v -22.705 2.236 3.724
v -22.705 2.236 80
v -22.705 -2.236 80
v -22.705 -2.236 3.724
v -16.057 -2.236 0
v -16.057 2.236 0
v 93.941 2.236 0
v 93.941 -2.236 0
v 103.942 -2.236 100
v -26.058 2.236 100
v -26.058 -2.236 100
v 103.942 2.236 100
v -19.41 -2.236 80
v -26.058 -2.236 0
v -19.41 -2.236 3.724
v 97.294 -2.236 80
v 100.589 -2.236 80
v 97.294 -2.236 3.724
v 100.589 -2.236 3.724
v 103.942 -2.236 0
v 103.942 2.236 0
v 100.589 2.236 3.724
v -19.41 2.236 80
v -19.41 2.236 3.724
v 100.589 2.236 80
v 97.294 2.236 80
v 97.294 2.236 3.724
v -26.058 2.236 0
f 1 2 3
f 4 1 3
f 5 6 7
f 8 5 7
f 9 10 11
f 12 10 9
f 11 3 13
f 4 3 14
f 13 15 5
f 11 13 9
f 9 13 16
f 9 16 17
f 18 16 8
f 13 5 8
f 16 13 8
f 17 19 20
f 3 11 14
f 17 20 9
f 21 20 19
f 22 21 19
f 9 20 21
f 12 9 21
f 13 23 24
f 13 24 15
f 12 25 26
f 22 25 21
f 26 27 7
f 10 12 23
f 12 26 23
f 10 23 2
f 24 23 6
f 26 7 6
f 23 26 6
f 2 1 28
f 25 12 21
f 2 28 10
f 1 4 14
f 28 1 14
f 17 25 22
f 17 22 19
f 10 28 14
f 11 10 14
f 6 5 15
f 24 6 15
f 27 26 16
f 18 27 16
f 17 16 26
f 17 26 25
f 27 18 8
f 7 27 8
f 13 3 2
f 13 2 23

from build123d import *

# Parameters (mm, degrees)
F1_DEPTH = 100
F2_W     = 3.295
F2_H     = 4.472
F3_DEPTH = 80
F4_W     = 3.295
F4_H     = 4.472
F5_DEPTH = 80
F7_DEPTH = 25
F9_DEPTH = 25


with BuildPart() as f1:
    # F0 (on Top) → F1 (new body)
    with BuildSketch(Plane.XY):
        Polygon((103.941999, 2.236), (-26.058001, 2.236), (-26.058001, 0), (-26.058001, -2.236), (103.941999, -2.236), (103.941999, 0), align=None)
    extrude(amount=F1_DEPTH)

    # F2 (on face) → F3 (cut)
    with BuildSketch(Plane(origin=(0, 0, 0), x_dir=(1, 0, 0), z_dir=(0, 0, -1))):
        with Locations((-21.057501, 0)):
            Rectangle(F2_W, F2_H)
    extrude(amount=-F3_DEPTH, mode=Mode.SUBTRACT)

    # F4 (on face) → F5 (cut)
    with BuildSketch(Plane(origin=(0, 0, 0), x_dir=(1, 0, 0), z_dir=(0, 0, -1))):
        with Locations((98.941499, 0)):
            Rectangle(F4_W, F4_H)
    extrude(amount=-F5_DEPTH, mode=Mode.SUBTRACT)

    # F6 (on face) → F7 (cut)
    with BuildSketch(Plane.XZ.offset(2.236)):
        Polygon((-22.705001, 3.723884), (-26.058001, 0), (-22.705001, 0), align=None)
        Polygon((-16.057001, 0), (-19.410001, 3.723884), (-19.410001, 0), align=None)
    extrude(amount=-F7_DEPTH, mode=Mode.SUBTRACT)

    # F8 (on face) → F9 (cut)
    with BuildSketch(Plane.XZ.offset(2.236)):
        Polygon((97.293999, 0), (97.293999, 3.723884), (93.940999, 0), align=None)
        Polygon((100.588999, 0), (103.941999, 0), (100.588999, 3.723884), align=None)
    extrude(amount=-F9_DEPTH, mode=Mode.SUBTRACT)


solid = f1.part
